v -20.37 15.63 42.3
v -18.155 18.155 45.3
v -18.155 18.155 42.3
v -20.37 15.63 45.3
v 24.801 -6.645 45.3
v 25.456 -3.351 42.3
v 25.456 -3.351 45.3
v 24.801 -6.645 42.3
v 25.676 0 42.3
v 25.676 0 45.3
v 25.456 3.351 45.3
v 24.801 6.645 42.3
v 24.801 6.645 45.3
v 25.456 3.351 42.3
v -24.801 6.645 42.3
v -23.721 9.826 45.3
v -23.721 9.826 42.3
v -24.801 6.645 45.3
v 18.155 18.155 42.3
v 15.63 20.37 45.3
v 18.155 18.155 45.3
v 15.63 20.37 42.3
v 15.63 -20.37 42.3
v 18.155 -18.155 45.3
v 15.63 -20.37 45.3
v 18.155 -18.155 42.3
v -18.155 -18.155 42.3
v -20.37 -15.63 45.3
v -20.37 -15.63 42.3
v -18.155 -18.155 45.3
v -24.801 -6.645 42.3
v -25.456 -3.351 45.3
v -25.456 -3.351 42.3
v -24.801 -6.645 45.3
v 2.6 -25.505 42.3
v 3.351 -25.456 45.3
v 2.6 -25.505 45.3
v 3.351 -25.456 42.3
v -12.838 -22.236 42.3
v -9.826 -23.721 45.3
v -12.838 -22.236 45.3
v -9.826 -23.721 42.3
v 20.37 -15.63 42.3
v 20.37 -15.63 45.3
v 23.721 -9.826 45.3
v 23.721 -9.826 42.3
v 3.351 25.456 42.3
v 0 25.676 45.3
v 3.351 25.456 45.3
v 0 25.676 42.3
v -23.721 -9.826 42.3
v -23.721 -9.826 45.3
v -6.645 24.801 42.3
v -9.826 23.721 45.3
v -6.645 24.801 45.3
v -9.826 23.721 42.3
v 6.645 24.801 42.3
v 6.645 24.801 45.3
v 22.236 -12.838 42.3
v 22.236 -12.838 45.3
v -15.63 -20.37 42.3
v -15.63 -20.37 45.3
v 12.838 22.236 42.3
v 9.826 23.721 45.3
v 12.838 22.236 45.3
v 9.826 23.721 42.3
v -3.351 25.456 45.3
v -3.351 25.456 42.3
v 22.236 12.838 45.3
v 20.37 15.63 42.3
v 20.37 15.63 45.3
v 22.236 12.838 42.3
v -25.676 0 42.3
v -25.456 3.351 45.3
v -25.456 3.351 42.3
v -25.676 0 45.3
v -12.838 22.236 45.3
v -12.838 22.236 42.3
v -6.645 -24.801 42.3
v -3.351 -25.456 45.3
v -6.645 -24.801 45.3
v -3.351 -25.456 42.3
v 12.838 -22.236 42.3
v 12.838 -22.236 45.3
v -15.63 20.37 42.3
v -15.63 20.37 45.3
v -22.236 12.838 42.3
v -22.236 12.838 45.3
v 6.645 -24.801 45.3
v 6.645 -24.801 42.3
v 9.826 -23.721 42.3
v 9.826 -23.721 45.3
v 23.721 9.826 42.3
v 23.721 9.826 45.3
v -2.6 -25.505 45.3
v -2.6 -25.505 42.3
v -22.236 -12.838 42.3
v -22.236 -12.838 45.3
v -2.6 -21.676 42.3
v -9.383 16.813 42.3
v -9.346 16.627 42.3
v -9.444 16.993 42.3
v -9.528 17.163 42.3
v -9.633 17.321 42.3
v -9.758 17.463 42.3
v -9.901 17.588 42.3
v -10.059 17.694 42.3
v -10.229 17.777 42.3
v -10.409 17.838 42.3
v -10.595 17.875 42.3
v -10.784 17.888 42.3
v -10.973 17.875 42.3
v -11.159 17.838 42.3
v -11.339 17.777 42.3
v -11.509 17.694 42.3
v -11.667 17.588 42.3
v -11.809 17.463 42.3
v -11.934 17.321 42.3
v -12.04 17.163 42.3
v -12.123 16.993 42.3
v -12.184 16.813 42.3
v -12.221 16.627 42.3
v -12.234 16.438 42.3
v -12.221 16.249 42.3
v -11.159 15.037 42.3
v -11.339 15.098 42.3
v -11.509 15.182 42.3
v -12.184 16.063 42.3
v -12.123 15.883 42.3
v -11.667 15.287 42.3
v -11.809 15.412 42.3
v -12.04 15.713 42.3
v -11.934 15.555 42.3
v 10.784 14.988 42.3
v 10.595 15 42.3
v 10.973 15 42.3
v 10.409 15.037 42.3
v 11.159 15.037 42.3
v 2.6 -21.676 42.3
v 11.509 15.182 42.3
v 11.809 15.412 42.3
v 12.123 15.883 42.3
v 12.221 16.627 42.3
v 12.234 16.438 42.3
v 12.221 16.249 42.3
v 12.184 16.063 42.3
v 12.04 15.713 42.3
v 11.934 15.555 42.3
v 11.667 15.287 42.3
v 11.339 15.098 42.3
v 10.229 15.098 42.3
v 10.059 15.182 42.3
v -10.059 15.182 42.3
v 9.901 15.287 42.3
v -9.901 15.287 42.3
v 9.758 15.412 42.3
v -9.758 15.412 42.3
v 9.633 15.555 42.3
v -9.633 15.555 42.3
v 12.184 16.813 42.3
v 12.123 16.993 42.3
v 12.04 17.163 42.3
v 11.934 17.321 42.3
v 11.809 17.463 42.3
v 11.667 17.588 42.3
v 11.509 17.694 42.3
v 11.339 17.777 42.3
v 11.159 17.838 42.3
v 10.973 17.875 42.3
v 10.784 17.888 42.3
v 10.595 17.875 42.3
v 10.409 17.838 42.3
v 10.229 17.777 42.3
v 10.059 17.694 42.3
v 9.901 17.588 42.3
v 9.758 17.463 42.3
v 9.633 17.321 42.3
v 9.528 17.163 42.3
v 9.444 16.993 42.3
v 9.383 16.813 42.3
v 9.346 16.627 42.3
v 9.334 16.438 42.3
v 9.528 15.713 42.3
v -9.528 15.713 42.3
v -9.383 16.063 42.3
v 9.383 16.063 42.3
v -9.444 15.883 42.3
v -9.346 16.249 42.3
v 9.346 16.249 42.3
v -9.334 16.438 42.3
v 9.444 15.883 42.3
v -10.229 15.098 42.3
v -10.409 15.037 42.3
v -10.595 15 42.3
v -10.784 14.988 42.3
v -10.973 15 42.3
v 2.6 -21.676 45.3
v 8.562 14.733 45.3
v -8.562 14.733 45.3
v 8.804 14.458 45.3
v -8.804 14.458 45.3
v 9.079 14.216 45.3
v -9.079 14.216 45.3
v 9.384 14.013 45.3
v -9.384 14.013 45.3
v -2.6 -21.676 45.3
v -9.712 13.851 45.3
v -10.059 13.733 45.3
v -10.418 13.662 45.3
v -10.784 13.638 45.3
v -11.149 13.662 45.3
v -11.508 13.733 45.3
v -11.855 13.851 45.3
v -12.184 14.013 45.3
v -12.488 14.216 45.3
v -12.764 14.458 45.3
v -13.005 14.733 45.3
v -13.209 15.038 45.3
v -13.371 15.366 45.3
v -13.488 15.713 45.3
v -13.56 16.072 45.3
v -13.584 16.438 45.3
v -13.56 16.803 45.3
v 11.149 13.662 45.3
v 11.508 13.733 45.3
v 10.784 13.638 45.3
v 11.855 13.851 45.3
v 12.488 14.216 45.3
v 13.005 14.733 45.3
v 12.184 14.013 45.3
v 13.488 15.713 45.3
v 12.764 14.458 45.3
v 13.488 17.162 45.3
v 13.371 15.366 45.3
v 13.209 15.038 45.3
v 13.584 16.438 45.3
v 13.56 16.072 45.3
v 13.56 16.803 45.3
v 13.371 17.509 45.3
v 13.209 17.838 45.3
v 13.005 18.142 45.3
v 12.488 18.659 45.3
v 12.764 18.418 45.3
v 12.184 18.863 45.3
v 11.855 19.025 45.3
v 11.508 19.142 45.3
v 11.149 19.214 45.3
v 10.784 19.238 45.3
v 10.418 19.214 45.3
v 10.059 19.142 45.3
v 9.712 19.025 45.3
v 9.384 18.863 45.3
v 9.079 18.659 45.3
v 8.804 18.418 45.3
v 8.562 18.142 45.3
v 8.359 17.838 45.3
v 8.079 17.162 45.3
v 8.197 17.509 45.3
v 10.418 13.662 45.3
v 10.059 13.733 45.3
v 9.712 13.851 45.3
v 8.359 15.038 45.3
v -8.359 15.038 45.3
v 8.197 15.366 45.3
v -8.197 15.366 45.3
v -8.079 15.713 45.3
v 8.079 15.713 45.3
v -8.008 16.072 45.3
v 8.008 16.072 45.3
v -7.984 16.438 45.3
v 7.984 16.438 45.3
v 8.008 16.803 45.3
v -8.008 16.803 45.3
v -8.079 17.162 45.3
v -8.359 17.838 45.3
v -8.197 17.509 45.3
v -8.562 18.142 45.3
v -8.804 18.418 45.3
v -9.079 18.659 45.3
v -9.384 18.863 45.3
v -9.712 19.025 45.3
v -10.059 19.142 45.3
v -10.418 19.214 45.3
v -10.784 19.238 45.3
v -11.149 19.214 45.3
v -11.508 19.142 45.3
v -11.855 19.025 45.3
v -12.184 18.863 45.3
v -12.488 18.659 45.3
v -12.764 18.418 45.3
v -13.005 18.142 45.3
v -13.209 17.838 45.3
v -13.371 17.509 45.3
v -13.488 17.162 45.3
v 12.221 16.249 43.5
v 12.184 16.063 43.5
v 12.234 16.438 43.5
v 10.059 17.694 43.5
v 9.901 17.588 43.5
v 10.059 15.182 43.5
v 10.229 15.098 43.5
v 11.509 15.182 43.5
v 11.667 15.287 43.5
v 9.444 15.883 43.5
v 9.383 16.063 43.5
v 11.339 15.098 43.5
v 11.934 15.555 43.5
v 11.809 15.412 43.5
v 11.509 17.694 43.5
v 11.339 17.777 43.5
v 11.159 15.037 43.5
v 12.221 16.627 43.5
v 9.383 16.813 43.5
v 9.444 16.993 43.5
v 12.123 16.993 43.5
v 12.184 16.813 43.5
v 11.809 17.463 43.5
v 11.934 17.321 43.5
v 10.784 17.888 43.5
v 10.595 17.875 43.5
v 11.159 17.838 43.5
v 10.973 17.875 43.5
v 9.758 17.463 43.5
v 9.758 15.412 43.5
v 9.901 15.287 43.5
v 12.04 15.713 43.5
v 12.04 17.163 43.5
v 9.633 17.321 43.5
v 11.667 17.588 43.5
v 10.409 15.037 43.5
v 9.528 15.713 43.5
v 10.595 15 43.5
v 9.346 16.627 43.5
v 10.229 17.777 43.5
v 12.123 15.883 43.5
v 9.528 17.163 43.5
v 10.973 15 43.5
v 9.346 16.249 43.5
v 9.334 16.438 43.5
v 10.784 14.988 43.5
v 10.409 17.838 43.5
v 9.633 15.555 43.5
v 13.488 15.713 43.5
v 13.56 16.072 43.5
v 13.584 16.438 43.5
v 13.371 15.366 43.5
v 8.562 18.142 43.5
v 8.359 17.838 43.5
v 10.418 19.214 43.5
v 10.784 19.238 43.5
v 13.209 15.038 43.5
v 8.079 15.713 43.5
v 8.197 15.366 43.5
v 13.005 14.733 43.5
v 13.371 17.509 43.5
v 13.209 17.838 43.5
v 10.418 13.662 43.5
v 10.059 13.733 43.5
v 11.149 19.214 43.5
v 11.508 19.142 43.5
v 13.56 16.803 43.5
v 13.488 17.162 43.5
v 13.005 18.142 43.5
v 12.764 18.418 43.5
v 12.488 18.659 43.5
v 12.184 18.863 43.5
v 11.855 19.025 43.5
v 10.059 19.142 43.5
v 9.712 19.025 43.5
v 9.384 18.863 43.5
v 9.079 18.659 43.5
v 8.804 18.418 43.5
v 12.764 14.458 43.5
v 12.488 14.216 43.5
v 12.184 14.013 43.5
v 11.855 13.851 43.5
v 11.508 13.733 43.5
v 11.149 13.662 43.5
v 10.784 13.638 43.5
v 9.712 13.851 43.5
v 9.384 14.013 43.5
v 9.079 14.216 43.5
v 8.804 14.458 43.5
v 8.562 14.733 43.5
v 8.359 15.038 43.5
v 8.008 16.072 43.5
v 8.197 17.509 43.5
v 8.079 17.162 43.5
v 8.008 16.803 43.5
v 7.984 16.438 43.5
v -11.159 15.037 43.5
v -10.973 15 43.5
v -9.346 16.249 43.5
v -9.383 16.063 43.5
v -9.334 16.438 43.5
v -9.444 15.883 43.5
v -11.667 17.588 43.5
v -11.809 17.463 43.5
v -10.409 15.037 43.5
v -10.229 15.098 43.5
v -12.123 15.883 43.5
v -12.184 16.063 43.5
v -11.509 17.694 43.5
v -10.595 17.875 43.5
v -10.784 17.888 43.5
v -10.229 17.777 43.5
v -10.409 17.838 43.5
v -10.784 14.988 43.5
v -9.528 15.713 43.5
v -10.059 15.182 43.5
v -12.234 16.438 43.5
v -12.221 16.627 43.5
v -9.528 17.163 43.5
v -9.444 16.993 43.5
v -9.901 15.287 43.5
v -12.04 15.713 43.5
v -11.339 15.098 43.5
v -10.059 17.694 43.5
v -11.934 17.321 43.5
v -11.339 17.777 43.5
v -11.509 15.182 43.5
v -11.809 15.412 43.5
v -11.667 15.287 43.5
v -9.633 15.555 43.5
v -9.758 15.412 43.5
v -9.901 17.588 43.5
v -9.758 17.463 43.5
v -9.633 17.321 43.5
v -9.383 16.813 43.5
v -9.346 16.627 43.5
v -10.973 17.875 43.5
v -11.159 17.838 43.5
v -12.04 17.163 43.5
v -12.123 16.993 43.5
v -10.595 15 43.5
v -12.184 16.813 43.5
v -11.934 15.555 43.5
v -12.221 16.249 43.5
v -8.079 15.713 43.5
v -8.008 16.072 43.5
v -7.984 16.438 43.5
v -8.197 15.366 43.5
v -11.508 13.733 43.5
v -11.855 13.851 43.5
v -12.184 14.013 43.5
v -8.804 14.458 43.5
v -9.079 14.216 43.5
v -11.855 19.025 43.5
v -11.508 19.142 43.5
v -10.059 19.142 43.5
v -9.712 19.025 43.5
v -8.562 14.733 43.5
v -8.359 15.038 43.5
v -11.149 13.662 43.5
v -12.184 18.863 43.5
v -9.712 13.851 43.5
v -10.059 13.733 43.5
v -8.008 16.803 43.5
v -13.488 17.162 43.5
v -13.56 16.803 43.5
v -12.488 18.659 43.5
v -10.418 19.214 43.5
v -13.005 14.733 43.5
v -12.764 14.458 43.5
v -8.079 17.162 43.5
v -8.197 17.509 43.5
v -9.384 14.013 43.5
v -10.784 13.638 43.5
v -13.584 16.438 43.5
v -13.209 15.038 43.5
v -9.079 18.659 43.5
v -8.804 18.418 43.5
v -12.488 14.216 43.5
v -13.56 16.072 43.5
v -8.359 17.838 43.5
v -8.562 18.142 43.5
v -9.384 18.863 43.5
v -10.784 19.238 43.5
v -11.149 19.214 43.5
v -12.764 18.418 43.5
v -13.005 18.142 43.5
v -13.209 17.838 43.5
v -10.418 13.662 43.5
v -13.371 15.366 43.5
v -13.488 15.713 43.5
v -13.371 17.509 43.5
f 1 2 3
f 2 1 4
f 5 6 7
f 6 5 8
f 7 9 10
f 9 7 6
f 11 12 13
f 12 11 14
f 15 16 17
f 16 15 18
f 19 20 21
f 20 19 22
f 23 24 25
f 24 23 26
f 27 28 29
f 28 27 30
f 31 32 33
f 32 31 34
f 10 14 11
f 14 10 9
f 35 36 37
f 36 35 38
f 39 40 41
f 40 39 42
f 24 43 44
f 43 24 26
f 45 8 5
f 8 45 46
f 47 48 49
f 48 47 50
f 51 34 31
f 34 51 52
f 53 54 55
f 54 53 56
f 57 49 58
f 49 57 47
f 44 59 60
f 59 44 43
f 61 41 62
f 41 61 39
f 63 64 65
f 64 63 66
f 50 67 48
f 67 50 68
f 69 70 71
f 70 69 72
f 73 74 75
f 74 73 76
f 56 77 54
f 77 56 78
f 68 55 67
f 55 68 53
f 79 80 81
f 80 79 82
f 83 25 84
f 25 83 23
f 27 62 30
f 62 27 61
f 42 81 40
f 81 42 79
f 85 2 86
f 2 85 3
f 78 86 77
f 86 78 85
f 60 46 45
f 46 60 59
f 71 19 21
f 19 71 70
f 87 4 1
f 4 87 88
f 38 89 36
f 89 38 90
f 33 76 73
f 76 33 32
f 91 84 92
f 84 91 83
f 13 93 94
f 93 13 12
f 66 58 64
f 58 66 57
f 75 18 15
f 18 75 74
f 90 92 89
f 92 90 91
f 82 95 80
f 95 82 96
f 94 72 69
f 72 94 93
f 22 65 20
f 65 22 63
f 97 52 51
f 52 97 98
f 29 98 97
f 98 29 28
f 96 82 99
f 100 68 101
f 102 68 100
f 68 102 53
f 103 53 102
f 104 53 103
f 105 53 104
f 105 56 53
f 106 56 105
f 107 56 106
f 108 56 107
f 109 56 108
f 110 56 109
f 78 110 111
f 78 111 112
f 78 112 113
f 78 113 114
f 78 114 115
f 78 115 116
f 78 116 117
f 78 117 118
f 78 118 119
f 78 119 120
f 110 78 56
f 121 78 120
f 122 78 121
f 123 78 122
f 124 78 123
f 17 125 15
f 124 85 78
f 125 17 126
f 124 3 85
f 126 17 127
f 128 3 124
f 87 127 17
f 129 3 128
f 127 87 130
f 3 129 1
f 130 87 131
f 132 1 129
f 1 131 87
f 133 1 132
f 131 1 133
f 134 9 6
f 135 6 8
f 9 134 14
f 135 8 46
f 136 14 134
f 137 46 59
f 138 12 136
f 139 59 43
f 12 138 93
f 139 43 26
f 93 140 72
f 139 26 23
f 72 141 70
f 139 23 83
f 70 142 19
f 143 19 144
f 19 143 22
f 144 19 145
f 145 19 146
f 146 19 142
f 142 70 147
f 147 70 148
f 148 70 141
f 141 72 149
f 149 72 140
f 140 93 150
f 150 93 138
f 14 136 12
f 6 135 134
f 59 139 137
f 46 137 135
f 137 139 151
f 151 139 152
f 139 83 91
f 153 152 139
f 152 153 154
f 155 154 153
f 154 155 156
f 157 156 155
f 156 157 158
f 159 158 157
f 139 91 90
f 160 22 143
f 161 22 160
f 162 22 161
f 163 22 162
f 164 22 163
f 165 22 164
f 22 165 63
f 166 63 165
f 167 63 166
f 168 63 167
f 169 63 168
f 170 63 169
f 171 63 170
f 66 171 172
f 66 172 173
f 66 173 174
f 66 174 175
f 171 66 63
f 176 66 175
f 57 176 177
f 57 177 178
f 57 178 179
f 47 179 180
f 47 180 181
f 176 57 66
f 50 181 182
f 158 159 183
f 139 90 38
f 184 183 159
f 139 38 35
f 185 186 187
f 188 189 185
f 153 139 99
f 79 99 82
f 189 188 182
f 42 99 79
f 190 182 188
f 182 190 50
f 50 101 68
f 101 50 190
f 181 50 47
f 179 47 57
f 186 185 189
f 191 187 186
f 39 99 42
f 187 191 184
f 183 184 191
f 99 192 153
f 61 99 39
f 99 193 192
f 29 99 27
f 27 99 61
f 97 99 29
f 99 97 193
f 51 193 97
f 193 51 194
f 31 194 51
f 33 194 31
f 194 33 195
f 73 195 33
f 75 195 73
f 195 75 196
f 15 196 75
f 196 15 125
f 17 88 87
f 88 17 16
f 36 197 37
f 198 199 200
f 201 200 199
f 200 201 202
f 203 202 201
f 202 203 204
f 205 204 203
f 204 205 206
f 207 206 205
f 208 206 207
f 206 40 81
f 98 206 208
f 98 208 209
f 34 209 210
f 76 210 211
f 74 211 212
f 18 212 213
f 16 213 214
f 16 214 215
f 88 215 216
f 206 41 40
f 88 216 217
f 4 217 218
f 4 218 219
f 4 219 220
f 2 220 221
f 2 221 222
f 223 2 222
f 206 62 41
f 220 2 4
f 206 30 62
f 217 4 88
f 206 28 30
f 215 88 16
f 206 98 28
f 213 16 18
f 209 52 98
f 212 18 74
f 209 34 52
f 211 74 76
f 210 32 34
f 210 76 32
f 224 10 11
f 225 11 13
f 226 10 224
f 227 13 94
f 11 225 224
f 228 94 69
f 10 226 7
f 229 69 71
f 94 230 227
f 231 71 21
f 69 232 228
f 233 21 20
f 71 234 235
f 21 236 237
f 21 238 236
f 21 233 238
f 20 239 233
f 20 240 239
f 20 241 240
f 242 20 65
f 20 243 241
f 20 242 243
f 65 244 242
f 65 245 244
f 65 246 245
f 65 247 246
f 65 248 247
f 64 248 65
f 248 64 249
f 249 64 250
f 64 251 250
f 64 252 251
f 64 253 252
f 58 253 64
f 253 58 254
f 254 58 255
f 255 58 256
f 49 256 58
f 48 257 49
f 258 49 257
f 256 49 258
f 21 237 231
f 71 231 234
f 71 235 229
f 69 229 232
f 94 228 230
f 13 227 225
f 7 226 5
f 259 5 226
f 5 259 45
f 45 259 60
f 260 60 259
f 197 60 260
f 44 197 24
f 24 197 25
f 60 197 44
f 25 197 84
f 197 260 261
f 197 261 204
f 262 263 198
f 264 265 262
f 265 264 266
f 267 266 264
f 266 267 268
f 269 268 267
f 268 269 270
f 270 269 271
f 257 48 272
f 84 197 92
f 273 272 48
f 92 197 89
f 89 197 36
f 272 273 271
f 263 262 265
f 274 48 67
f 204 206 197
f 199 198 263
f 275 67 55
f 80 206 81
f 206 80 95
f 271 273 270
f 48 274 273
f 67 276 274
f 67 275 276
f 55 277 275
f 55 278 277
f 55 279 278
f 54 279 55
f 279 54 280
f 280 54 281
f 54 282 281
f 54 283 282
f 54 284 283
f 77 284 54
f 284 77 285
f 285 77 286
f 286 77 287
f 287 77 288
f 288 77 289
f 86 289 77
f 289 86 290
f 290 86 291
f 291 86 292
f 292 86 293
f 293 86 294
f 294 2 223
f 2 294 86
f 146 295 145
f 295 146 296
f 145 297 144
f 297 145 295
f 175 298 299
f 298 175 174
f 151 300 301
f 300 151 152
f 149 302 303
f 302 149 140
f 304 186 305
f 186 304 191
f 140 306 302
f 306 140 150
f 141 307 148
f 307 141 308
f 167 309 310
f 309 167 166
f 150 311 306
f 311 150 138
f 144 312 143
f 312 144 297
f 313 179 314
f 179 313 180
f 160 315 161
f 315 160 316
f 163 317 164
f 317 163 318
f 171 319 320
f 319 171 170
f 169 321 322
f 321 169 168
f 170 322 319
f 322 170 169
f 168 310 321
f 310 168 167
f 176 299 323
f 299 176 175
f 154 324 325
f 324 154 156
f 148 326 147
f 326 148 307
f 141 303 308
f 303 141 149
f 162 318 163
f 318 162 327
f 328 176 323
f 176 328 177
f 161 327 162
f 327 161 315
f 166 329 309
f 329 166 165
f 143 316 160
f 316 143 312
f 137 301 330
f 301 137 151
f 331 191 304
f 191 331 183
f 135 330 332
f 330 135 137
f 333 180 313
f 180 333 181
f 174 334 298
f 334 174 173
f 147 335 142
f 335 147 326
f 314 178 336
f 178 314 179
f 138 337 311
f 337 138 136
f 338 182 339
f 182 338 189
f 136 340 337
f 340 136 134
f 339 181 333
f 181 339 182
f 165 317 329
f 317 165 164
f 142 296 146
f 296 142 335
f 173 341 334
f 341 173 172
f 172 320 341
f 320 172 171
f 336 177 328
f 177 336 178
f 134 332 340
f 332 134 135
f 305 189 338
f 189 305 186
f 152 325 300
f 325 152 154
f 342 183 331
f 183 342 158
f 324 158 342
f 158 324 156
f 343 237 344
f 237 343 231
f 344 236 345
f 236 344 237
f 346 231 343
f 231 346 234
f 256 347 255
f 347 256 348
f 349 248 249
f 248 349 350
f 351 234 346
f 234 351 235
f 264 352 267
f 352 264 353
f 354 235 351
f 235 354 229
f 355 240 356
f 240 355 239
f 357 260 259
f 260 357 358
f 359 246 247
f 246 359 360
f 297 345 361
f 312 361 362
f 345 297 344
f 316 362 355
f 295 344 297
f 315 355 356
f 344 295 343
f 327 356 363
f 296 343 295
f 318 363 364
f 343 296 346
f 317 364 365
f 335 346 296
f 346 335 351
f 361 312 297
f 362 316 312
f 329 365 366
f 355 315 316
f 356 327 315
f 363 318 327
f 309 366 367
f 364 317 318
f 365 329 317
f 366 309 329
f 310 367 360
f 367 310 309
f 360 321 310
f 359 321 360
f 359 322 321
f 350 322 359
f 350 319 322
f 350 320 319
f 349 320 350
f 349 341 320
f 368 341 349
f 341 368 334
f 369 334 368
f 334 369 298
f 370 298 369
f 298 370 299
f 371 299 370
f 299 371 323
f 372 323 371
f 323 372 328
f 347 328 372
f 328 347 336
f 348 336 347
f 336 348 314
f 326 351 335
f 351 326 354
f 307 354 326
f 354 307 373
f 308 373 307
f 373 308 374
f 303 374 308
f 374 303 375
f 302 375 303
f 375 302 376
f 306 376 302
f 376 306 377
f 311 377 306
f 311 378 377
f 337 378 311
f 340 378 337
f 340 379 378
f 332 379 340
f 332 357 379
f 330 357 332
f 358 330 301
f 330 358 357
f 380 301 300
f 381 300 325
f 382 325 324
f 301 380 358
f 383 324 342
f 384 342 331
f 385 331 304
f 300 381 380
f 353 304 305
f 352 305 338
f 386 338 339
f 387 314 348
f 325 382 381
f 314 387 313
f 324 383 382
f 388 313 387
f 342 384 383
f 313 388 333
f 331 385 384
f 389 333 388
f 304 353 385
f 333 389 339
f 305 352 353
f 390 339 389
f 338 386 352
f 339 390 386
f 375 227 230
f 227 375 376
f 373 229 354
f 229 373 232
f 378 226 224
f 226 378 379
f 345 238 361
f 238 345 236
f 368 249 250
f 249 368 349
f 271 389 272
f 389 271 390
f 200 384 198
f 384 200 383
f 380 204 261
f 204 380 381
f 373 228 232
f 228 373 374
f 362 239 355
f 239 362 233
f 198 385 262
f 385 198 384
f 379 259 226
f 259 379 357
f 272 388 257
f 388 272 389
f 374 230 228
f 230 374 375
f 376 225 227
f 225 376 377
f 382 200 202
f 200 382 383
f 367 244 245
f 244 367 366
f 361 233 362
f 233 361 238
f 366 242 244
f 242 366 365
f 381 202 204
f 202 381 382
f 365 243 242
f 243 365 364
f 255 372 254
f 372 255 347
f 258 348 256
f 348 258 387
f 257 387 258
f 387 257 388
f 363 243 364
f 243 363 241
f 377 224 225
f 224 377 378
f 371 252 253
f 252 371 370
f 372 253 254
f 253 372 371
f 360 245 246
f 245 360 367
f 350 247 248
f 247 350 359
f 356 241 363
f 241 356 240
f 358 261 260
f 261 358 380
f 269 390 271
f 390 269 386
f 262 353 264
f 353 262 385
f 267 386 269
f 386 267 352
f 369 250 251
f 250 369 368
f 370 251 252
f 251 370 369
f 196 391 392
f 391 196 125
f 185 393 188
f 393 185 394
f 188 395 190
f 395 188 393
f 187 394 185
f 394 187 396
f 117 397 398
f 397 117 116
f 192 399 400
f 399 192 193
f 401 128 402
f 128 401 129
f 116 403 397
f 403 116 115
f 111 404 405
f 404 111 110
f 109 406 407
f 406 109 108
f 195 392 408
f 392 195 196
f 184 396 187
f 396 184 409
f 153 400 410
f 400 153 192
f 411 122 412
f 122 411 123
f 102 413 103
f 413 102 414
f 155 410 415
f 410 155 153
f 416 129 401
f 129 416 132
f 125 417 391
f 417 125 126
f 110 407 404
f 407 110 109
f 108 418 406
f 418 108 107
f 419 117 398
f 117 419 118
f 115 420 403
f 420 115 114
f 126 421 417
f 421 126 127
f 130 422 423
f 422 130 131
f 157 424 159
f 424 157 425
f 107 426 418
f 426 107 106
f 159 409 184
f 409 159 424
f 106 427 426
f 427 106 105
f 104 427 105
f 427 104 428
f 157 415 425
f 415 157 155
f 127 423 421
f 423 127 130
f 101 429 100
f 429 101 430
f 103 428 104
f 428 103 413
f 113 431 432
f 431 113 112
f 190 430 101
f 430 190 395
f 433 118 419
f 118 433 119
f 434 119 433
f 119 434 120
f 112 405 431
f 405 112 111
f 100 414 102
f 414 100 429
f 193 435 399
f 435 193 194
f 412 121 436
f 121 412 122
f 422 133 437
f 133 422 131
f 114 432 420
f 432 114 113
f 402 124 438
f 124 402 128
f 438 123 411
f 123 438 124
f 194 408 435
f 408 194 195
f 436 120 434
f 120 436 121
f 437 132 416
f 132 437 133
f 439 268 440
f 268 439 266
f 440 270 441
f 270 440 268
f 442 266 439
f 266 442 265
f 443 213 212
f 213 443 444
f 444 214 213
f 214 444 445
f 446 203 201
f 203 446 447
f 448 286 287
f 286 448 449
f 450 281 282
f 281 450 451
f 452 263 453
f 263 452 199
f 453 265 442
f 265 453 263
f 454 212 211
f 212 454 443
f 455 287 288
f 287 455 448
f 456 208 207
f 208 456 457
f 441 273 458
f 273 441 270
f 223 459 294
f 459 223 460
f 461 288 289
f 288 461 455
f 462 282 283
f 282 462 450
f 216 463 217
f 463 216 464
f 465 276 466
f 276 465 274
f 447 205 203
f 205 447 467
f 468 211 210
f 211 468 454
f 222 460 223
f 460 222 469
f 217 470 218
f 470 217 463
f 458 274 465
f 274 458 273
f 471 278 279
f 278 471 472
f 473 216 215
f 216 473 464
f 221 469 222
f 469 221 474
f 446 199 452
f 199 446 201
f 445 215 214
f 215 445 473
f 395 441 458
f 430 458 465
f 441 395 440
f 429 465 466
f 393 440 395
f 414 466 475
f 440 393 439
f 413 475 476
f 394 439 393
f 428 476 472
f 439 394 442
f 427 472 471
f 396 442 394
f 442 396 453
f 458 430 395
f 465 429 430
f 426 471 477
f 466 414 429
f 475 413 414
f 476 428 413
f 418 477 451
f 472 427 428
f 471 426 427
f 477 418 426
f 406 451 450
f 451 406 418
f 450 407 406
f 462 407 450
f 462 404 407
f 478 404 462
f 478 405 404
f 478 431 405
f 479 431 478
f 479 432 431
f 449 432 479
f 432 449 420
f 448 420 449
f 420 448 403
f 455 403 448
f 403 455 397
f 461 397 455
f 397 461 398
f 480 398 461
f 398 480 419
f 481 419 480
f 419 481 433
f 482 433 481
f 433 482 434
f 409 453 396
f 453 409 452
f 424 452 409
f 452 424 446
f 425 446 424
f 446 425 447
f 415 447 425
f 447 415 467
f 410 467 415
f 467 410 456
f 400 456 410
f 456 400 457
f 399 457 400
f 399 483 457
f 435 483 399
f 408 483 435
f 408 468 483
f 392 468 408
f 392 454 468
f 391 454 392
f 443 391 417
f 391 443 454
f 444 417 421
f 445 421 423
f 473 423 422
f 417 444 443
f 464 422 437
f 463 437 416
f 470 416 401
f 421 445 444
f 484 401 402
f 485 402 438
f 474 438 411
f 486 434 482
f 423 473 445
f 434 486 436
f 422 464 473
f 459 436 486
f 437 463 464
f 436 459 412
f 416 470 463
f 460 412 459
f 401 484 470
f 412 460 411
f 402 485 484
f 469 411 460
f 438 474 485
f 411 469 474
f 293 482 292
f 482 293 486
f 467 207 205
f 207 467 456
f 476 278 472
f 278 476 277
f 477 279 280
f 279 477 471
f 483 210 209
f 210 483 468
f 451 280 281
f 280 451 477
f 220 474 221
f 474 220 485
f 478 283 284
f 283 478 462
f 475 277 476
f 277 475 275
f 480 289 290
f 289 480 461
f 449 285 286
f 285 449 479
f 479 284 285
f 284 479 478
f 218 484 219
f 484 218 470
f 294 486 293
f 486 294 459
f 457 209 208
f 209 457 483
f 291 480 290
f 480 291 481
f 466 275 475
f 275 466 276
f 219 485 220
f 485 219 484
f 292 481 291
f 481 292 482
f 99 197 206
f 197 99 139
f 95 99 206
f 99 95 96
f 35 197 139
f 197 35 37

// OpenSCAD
// right cartridge_cap_yaw: press F6 (render) then File > Export > STL
include <../lib/g1_servo_arm.scad>
side = "right";
part = "cartridge_cap_yaw";
